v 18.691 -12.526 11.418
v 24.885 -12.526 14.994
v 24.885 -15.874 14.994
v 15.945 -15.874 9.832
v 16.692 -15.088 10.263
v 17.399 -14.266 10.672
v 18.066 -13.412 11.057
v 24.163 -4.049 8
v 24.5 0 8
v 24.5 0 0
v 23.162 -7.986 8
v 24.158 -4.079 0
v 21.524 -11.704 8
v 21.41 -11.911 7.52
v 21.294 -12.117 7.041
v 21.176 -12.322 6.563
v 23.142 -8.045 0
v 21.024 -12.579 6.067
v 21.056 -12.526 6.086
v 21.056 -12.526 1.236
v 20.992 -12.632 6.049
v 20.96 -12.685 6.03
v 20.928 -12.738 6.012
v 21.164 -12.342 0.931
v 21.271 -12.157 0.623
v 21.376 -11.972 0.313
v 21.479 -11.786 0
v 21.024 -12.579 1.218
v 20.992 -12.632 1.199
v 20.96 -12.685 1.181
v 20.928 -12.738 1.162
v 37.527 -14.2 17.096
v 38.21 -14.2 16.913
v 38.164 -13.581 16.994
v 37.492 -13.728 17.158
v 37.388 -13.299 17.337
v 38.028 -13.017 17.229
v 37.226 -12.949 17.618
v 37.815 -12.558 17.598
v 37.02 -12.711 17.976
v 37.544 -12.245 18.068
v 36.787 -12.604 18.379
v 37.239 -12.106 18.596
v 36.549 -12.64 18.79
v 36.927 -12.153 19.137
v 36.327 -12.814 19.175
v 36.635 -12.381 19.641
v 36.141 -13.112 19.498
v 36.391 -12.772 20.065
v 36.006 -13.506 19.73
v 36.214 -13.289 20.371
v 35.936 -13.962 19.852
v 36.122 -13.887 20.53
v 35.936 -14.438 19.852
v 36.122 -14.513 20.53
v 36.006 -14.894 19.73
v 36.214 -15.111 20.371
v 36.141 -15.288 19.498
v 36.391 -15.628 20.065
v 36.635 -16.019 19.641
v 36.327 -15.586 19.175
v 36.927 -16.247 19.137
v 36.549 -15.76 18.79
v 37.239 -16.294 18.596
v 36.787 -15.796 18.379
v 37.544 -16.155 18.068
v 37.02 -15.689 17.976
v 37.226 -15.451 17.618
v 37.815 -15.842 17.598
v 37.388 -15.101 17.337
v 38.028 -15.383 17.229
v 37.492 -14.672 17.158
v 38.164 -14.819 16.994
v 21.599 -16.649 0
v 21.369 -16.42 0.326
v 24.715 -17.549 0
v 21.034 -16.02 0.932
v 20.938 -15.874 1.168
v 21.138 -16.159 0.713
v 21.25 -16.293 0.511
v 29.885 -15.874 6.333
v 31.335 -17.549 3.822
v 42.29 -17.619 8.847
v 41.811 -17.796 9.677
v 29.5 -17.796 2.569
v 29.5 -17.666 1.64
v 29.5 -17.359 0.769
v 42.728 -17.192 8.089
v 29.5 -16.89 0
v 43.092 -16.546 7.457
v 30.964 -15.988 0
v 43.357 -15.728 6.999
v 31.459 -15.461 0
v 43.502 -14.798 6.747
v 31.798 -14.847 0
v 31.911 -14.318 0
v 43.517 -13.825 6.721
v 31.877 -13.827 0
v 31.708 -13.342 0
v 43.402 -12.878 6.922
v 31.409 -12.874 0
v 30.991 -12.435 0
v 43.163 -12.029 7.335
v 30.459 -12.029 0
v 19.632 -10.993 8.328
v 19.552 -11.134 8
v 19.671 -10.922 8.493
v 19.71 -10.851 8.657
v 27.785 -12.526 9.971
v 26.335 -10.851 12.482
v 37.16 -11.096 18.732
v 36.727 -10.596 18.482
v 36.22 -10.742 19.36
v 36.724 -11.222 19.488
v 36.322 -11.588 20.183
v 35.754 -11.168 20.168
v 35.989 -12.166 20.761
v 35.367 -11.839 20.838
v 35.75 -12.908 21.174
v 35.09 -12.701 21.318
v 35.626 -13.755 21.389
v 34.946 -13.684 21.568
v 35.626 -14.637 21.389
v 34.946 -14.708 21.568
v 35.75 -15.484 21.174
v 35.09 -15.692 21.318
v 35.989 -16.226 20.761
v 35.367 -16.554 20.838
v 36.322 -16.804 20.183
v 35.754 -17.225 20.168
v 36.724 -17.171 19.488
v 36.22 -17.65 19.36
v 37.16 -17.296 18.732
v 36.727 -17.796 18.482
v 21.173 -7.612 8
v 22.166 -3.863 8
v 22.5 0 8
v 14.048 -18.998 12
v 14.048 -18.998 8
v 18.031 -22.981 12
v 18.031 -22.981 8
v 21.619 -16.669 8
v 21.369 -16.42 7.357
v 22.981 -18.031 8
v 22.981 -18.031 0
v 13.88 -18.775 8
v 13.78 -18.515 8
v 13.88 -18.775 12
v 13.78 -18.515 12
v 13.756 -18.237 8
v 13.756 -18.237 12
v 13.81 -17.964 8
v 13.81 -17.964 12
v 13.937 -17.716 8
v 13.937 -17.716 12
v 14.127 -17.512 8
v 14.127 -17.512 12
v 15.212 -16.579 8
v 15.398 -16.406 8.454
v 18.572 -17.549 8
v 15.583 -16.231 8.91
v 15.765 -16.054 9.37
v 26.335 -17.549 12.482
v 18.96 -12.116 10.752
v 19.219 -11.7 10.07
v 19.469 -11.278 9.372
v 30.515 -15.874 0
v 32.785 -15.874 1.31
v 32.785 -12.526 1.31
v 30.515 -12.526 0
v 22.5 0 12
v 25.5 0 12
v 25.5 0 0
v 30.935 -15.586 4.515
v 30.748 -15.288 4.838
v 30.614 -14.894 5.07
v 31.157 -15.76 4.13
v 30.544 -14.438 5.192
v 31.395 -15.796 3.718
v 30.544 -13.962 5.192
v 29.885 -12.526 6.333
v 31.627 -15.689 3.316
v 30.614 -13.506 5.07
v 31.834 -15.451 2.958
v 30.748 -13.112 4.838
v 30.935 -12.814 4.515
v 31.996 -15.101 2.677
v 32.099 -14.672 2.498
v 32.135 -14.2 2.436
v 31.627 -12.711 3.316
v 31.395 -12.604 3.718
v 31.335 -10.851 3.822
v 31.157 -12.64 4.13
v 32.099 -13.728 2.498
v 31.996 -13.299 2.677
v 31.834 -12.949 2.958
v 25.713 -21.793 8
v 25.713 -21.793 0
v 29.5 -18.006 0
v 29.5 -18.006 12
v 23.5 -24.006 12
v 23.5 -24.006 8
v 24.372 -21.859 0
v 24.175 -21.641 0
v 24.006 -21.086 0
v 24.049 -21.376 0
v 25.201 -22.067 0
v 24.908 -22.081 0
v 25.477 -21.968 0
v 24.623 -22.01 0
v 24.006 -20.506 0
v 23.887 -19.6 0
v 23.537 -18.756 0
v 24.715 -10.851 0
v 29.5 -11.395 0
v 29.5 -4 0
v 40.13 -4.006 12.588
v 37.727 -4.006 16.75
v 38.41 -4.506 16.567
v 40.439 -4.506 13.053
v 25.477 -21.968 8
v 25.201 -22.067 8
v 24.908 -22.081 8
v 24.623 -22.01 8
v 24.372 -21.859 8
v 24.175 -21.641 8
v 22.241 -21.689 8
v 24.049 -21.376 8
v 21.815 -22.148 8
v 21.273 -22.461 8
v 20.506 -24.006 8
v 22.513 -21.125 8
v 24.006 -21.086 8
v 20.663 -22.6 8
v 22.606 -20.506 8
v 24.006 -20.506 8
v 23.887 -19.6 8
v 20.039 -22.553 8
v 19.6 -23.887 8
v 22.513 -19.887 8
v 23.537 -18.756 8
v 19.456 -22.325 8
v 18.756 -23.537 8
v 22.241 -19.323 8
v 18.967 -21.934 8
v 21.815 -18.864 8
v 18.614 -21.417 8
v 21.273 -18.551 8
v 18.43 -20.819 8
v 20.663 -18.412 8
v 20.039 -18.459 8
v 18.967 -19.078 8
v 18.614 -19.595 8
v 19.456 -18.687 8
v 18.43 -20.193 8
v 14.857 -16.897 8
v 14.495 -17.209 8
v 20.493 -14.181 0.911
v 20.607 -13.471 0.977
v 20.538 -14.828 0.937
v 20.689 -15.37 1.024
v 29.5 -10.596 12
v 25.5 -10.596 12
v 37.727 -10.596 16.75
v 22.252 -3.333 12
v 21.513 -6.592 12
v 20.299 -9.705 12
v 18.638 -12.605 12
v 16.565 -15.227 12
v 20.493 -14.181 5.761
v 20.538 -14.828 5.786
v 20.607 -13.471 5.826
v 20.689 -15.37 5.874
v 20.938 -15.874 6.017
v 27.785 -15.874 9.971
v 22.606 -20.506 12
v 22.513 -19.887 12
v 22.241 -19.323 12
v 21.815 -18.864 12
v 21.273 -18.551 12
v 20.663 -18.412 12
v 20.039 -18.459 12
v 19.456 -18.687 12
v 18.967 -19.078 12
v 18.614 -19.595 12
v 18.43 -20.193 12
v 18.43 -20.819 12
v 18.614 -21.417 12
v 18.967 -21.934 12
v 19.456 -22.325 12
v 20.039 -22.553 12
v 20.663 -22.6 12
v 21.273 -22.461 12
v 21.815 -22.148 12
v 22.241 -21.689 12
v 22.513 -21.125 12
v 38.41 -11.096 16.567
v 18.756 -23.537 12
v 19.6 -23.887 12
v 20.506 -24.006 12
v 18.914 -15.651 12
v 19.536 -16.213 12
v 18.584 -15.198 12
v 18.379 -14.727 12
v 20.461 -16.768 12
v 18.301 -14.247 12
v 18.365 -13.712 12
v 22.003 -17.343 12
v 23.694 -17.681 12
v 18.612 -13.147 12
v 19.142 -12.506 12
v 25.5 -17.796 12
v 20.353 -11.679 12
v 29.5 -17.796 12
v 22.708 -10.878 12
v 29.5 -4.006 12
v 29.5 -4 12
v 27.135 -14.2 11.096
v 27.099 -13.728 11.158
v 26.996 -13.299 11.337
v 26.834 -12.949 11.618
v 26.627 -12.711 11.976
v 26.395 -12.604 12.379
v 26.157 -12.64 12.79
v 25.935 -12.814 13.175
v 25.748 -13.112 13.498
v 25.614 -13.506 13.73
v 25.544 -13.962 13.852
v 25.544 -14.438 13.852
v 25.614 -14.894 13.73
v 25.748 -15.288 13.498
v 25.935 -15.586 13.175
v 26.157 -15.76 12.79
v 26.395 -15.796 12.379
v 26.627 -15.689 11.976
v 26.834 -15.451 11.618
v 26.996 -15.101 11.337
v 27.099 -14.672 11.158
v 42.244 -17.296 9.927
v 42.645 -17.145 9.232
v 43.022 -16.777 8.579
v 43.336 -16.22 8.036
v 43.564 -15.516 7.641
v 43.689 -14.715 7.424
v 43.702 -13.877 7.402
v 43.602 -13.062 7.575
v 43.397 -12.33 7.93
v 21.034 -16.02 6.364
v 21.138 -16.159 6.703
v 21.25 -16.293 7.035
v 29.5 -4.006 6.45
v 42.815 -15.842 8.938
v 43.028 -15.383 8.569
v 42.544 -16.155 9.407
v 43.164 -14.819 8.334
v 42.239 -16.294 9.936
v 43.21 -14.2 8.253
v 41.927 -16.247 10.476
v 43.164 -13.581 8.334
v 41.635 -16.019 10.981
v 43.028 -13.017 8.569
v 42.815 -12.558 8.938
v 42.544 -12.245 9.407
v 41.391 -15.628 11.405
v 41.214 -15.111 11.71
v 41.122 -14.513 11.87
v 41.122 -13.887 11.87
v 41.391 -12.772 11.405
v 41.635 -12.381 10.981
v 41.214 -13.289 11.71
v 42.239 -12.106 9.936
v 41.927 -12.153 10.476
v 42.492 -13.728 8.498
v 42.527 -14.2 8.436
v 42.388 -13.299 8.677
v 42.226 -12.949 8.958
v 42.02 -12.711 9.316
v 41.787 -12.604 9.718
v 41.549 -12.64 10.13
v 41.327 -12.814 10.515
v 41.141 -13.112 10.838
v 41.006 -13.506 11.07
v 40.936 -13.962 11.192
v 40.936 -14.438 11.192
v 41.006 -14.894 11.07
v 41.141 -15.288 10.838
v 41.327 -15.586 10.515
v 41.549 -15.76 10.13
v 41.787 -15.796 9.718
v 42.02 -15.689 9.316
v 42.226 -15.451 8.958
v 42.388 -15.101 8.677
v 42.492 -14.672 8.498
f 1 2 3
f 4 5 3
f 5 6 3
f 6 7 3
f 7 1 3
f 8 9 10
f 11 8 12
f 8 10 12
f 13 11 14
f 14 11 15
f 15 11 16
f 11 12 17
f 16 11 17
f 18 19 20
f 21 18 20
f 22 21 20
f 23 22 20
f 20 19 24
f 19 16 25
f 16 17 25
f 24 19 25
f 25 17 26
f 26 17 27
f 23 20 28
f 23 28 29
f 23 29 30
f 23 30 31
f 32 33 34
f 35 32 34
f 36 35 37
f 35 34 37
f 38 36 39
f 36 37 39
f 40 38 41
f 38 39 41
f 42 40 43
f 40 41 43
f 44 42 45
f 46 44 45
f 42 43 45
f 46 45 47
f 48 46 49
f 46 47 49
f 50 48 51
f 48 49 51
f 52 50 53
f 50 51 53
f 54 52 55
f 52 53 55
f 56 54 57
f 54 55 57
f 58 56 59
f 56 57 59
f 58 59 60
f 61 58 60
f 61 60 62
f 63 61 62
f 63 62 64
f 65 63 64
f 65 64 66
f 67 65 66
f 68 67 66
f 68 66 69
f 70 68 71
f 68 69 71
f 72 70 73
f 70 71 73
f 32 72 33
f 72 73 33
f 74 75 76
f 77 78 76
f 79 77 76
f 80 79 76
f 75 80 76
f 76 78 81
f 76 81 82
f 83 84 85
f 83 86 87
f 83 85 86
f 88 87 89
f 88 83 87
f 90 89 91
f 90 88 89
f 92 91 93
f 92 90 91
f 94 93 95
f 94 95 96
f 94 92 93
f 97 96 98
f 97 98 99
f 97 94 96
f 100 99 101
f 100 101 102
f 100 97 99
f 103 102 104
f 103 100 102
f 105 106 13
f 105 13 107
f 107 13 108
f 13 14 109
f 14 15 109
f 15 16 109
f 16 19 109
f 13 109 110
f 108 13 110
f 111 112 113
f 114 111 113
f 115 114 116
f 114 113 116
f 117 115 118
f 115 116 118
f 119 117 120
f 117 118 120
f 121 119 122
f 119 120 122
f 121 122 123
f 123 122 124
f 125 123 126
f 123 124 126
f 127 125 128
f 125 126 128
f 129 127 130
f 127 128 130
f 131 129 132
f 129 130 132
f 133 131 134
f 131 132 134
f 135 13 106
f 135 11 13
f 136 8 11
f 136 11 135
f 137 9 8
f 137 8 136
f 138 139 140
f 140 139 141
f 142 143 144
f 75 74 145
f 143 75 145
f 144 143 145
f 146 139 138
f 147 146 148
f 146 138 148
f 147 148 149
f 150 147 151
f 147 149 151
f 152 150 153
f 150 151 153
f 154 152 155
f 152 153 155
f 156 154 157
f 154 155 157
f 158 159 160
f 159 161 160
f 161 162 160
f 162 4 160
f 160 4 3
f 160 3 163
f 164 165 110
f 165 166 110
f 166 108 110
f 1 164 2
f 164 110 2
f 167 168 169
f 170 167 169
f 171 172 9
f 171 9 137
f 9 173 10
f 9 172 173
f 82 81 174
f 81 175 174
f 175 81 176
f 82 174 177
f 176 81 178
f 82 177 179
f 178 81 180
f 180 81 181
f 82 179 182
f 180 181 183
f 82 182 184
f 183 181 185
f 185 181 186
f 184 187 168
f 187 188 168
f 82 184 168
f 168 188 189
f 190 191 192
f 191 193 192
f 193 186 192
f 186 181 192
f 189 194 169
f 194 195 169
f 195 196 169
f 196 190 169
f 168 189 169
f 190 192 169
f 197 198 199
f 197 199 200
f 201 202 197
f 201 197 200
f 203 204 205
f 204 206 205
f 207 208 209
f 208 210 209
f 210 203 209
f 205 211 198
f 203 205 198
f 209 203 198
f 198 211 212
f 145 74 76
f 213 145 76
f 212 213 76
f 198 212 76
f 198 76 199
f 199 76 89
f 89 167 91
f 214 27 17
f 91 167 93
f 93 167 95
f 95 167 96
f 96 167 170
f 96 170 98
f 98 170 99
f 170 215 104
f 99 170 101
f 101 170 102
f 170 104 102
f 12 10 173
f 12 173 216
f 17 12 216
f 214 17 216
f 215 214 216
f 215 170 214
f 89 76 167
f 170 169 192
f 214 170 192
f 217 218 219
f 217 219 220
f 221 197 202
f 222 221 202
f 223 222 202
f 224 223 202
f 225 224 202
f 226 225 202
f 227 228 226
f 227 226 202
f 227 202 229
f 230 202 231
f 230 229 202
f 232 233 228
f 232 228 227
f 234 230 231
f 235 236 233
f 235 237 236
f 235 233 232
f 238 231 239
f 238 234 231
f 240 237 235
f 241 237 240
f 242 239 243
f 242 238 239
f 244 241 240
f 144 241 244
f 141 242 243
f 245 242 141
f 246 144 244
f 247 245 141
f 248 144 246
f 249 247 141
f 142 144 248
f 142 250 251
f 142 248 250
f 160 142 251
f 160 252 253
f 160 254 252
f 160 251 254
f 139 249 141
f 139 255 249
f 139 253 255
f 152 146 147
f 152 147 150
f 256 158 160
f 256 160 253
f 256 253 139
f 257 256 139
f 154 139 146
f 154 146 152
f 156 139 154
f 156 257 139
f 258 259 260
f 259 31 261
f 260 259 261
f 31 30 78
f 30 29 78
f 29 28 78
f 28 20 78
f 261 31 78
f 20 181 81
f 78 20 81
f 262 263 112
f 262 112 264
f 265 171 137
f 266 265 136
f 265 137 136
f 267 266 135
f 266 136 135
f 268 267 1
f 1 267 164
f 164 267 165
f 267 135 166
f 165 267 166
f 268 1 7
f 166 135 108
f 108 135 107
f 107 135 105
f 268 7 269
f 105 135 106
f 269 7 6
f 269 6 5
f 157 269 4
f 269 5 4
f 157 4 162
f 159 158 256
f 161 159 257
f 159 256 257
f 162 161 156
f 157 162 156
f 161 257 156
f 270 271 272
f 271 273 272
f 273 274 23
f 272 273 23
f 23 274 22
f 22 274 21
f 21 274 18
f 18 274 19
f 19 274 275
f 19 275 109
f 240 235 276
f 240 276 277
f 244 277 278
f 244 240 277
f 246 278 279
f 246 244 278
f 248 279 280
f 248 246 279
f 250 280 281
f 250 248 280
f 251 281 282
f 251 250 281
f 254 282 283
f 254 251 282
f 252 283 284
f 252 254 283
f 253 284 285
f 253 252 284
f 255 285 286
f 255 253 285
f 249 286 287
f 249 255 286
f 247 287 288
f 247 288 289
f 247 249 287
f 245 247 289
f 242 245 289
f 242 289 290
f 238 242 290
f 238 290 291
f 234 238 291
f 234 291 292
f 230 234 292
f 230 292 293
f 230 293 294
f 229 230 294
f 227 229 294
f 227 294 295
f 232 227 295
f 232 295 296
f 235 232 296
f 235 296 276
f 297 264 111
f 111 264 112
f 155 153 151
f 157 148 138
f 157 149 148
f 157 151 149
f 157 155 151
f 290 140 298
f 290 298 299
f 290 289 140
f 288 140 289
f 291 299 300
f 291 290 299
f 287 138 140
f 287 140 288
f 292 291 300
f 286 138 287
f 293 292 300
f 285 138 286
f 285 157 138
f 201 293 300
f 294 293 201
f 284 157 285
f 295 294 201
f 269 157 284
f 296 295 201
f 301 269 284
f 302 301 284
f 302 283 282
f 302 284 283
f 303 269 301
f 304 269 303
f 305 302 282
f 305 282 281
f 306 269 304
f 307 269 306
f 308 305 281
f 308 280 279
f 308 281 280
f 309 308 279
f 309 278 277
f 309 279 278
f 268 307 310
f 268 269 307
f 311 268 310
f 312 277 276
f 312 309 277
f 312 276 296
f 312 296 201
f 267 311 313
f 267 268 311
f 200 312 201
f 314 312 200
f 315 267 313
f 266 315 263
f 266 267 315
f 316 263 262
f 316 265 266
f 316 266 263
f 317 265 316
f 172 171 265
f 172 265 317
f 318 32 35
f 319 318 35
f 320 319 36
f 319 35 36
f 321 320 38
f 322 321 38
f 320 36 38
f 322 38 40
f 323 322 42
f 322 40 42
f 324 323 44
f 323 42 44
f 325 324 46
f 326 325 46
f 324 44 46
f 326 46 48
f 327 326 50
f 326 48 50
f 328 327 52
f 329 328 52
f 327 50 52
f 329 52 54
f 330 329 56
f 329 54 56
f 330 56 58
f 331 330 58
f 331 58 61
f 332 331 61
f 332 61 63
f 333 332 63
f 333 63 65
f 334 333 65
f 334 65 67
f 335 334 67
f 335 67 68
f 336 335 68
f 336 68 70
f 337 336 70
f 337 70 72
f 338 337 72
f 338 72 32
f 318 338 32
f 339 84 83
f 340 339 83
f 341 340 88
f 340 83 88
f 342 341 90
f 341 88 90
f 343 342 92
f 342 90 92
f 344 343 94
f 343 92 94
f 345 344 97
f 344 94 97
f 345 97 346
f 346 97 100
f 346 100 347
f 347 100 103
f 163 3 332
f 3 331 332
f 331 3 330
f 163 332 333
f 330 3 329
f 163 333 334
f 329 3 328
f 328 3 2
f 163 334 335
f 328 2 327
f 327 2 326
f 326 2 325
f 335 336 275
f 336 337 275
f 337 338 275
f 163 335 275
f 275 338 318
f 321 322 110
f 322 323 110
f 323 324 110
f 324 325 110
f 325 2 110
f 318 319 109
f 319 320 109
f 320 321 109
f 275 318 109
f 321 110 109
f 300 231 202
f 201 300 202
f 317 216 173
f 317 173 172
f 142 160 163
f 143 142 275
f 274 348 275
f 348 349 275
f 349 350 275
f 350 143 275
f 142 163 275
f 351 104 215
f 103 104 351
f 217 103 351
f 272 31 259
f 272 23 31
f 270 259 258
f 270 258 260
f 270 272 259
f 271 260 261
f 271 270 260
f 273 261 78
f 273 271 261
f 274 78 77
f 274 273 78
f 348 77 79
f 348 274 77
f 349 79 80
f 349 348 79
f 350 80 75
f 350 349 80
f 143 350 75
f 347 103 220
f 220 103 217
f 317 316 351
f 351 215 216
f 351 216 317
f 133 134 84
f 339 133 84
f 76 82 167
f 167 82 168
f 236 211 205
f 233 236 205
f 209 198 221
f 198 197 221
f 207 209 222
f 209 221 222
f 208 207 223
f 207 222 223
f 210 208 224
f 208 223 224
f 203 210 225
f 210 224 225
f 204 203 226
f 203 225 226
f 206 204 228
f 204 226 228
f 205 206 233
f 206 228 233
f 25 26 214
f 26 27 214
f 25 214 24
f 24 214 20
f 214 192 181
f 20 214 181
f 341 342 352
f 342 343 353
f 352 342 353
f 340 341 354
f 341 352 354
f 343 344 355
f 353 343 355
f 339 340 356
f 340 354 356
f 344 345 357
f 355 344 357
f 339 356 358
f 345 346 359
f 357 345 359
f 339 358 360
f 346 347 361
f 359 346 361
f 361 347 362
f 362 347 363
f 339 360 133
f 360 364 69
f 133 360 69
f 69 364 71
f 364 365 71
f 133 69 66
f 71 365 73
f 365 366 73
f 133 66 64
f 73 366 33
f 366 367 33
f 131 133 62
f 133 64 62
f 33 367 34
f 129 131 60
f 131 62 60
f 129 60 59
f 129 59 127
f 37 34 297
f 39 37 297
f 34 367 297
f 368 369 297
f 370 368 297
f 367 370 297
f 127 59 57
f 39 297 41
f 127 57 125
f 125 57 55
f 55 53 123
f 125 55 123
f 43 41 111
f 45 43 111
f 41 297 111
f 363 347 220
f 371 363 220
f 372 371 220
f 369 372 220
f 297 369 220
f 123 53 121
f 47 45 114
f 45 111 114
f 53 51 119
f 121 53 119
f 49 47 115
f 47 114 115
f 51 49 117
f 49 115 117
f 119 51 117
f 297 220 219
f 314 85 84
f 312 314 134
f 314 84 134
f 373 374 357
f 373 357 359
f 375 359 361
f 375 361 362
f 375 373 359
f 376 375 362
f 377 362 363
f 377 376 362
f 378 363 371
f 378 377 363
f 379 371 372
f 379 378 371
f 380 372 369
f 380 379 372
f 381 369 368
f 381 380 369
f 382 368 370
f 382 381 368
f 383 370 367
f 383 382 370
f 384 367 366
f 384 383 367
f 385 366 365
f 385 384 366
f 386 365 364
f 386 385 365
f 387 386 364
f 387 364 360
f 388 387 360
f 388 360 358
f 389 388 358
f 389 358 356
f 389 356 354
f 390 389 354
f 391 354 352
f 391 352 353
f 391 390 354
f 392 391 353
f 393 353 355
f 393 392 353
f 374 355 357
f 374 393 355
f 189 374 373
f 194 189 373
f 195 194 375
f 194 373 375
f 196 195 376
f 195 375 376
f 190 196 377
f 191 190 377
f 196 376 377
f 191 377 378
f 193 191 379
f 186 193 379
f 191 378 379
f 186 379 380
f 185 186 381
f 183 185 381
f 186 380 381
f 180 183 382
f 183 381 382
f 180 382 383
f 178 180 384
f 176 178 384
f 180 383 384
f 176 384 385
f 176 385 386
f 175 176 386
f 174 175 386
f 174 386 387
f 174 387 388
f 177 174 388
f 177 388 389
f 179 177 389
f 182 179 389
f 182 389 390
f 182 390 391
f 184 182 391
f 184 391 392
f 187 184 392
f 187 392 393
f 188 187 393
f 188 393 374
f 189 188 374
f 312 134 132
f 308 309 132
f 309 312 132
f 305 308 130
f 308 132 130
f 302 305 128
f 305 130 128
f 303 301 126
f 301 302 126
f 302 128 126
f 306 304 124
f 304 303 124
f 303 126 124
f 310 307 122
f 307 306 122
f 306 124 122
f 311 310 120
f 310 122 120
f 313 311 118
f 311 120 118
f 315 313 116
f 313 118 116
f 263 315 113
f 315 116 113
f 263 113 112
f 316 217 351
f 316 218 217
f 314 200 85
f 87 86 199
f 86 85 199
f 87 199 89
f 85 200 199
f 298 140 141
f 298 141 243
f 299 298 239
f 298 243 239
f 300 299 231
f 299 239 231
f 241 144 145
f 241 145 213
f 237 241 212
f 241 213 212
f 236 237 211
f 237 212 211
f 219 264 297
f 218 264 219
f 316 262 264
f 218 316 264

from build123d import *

# Parameters (mm, degrees)
SKETCH1_R           = 2.100000000000001
BOSS_EXTRUDE1_DEPTH = 12
BOSS_EXTRUDE2_START = -6.21
BOSS_EXTRUDE2_DEPTH = 13.79
CUT_EXTRUDE1_DEPTH  = 8
BOSS_EXTRUDE3_REACH = 41.051
SKETCH4_R           = 1.6
SKETCH4_R_2         = 1.6000000000000019
CUT_EXTRUDE2_DEPTH  = 40.05068839257359
CHAMFER2_SIZE       = 4
CUT_EXTRUDE3_REACH  = 41.051
CHAMFER3_SIZE       = 6
CUT_EXTRUDE4_START  = -12.5
CUT_EXTRUDE4_DEPTH  = 27.550688504002913
FILLET1_R           = 1
CHAMFER4_SIZE       = 0.5
FILLET2_R           = 3


with BuildPart() as part:
    # Sketch1 → Boss-Extrude1 (new body)
    with BuildSketch(Plane.XY):
        with BuildLine():
            Line((13.241359911348773, -18.191107379654646), (18.031222920256923, -22.980970388562806))
            ThreePointArc((18.031222920256923, -22.980970388562806), (19.166704641132032, -23.73967501819941), (20.50609665440986, -24.006096654409898))
            Line((20.50609665440986, -24.006096654409898), (29.499999999999993, -24.006096654409898))
            Line((29.499999999999993, -24.006096654409898), (29.499999999999993, 3.7e-16))
            Line((29.499999999999993, 3.7e-16), (22.500000000000007, 1.32e-15))
            ThreePointArc((22.500000000000007, 1.32e-15), (20.052189381777588, -10.205866009179541), (13.241359911348773, -18.191107379654646))
        make_face()
        with Locations((20.506096654409866, -20.5060966544099)):
            Circle(SKETCH1_R, mode=Mode.SUBTRACT)
    extrude(amount=BOSS_EXTRUDE1_DEPTH)

    # Sketch2 → Boss-Extrude2 (add)
    with BuildSketch(Plane.XZ.offset(24.006096654409898).offset(BOSS_EXTRUDE2_START)):
        Polygon((36.42820323027541, 1.1e-16), (29.499999999999993, 0), (29.499999999999993, 12), (38.1602540378444, 16.99999999999995), (45.08845726811982, 4.999999999999951), align=None)
    extrude(amount=-BOSS_EXTRUDE2_DEPTH)

    # Sketch3 → Cut-Extrude1 (cut)
    with BuildSketch(Plane(origin=(0, 0, 0), x_dir=(-1, 0, 0), z_dir=(0, 0, -1))):
        with BuildLine():
            Line((-18.031222920256923, -22.980970388562806), (-14.671554465329313, -19.621301933635188))
            ThreePointArc((-14.671554465329313, -19.621301933635188), (17.324116139070405, 17.324116139070437), (-19.621301933635156, -14.671554465329354))
            Line((-19.621301933635156, -14.671554465329354), (-22.98097038856278, -18.031222920256983))
            ThreePointArc((-22.98097038856278, -18.031222920256983), (-23.739675018199375, -19.1667046411321), (-24.00609665440987, -20.506096654409927))
            Line((-24.00609665440987, -20.506096654409927), (-24.00609665440987, -24.0060966544099))
            Line((-24.00609665440987, -24.0060966544099), (-20.50609665440986, -24.006096654409905))
            ThreePointArc((-20.50609665440986, -24.006096654409905), (-19.166704641132036, -23.739675018199403), (-18.031222920256923, -22.980970388562806))
        make_face()
    extrude(amount=-CUT_EXTRUDE1_DEPTH, mode=Mode.SUBTRACT)

    # Boss-Extrude3: up to this plane
    boss_extrude3_end = Plane(origin=(0, 0, 12), z_dir=(0, 0, 1))
    # Sketch5 → Boss-Extrude3 (add, up to the surface)
    with BuildSketch(Plane(origin=(35.98140646055117, 0, 20.77387470582027), x_dir=(0.4999999999999946, 0, -0.8660254037844417), z_dir=(0.8660254037844417, 0, 0.4999999999999946)), mode=Mode.PRIVATE) as boss_extrude3_sk1:
        with BuildLine():
            Line((2.357695154586543, -10.5960966544099), (4.357695154586543, -10.5960966544099))
            Line((4.357695154586543, -10.5960966544099), (4.357695154586545, -17.796096654409897))
            Line((4.357695154586545, -17.796096654409897), (2.3576951545865437, -17.796096654409897))
            ThreePointArc((2.3576951545865437, -17.796096654409897), (-1.2423048454134564, -14.1960966544099), (2.357695154586543, -10.5960966544099))
        make_face()
    boss_extrude3_tool1 = split(extrude(boss_extrude3_sk1.sketch, amount=-BOSS_EXTRUDE3_REACH, mode=Mode.PRIVATE), bisect_by=boss_extrude3_end, keep=Keep.BOTH, mode=Mode.PRIVATE)
    add(boss_extrude3_tool1.solids().sort_by_distance((36.919961, -14.196097, 19.148251))[0])

    # Sketch4 → Cut-Extrude2 (cut, through all)
    with BuildSketch(Plane(origin=(35.98140646055118, 0, 20.773874705820273), x_dir=(0.49999999999999495, 0, -0.8660254037844417), z_dir=(0.8660254037844417, 0, 0.49999999999999495))):
        with Locations((2.357695154586536, -14.2)):
            Circle(SKETCH4_R)
        with Locations((12.357695154586537, -14.2)):
            Circle(SKETCH4_R_2)
    extrude(amount=-CUT_EXTRUDE2_DEPTH, mode=Mode.SUBTRACT)

    # Chamfer2
    chamfer2_edges = [part.edges().sort_by_distance(p)[0] for p in [
        (29.499999999999993, 3.7e-16, 6),
    ]]
    chamfer(chamfer2_edges, length=CHAMFER2_SIZE)

    # Cut-Extrude3: up to this plane
    cut_extrude3_end = Plane(origin=(29.499999999999993, -24.006096654409898, 12), z_dir=(-1, 0, 0))
    # Sketch7 → Cut-Extrude3 (cut, up to the surface)
    with BuildSketch(Plane(origin=(35.98140646055117, 0, 20.77387470582027), x_dir=(0.4999999999999946, 0, -0.8660254037844417), z_dir=(0.8660254037844417, 0, 0.4999999999999946)), mode=Mode.PRIVATE) as cut_extrude3_sk1:
        with BuildLine():
            Line((15.22937626137959, -12.028952413951306), (9.16393898536506, -4.0060966544099))
            Line((9.16393898536506, -4.0060966544099), (22.041886428240783, -4.0060966544099))
            Line((22.041886428240783, -4.0060966544099), (22.041886428240783, -24.0060966544099))
            Line((22.041886428240783, -24.0060966544099), (2.357695154586543, -24.006096654409905))
            Line((2.357695154586543, -24.006096654409905), (2.357695154586542, -17.796096654409897))
            Line((2.357695154586542, -17.796096654409897), (12.357695154586544, -17.8))
            ThreePointArc((12.357695154586544, -17.8), (15.580719457145811, -15.803781264734175), (15.22937626137959, -12.028952413951306))
        make_face()
    cut_extrude3_tool1 = split(extrude(cut_extrude3_sk1.sketch, amount=-CUT_EXTRUDE3_REACH, mode=Mode.PRIVATE), bisect_by=cut_extrude3_end, keep=Keep.BOTH, mode=Mode.PRIVATE)
    add(cut_extrude3_tool1.solids().sort_by_distance((42.191658, -7.848292, 10.017403))[0], mode=Mode.SUBTRACT)

    # Chamfer3
    chamfer3_edges = [part.edges().sort_by_distance(p)[0] for p in [
        (29.499999999999993, -24.006096654409898, 6),
    ]]
    chamfer(chamfer3_edges, length=CHAMFER3_SIZE)

    # Sketch8 → Cut-Extrude4 (cut, through all)
    with BuildSketch(Plane(origin=(35.98140646055117, 0, 20.77387470582027), x_dir=(0.4999999999999946, 0, -0.8660254037844417), z_dir=(0.8660254037844417, 0, 0.4999999999999946)).offset(CUT_EXTRUDE4_START)):
        Polygon((5.257695154586542, -15.874315780649912), (5.257695154586541, -12.525684219350083), (2.3576951545865397, -10.85136843870017), (-0.5423048454134567, -12.525684219350083), (-0.5423048454134562, -15.874315780649912), (2.3576951545865446, -17.54863156129983), align=None)
        Polygon((9.457695154586544, -12.525684219350088), (9.457695154586544, -15.874315780649908), (12.35769515458654, -17.54863156129982), (15.257695154586537, -15.874315780649905), (15.257695154586537, -12.525684219350087), (12.357695154586539, -10.851368438700176), align=None)
    extrude(amount=-CUT_EXTRUDE4_DEPTH, mode=Mode.SUBTRACT)

    # Fillet1
    fillet1_edges = [part.edges().sort_by_distance(p)[0] for p in [
        (13.241359911348777, -18.191107379654646, 10),
        (24.00609665440987, -23.50000000000002, 4),
    ]]
    fillet(fillet1_edges, radius=FILLET1_R)

    # Chamfer4
    chamfer4_edges = [part.edges().sort_by_distance(p)[0] for p in [
        (36.36025403784444, -14.2, 20.11769145362395),
        (41.36025403784439, -14.2, 11.457437415779536),
        (39.70215336073716, -17.796096654409897, 14.329352032593636),
        (35.36025403784445, -14.1960966544099, 21.849742261192826),
        (37.660254037844425, -10.5960966544099, 17.866025403784395),
        (38.1602540378444, -7.3010966544099, 16.99999999999995),
        (39.36181499553902, -4.006096654409898, 14.918835372881723),
        (42.079735272237265, -8.017524534180602, 10.211259362718662),
        (43.790000296334796, -15.728302500078335, 7.2489934465736905),
    ]]
    chamfer(chamfer4_edges, length=CHAMFER4_SIZE)

    # Fillet2
    fillet2_edges = [part.edges().sort_by_distance(p)[0] for p in [
        (19.621301933635156, -14.671554465329354, 2.8324293970035703),
    ]]
    fillet(fillet2_edges, radius=FILLET2_R)


solid = part.part
